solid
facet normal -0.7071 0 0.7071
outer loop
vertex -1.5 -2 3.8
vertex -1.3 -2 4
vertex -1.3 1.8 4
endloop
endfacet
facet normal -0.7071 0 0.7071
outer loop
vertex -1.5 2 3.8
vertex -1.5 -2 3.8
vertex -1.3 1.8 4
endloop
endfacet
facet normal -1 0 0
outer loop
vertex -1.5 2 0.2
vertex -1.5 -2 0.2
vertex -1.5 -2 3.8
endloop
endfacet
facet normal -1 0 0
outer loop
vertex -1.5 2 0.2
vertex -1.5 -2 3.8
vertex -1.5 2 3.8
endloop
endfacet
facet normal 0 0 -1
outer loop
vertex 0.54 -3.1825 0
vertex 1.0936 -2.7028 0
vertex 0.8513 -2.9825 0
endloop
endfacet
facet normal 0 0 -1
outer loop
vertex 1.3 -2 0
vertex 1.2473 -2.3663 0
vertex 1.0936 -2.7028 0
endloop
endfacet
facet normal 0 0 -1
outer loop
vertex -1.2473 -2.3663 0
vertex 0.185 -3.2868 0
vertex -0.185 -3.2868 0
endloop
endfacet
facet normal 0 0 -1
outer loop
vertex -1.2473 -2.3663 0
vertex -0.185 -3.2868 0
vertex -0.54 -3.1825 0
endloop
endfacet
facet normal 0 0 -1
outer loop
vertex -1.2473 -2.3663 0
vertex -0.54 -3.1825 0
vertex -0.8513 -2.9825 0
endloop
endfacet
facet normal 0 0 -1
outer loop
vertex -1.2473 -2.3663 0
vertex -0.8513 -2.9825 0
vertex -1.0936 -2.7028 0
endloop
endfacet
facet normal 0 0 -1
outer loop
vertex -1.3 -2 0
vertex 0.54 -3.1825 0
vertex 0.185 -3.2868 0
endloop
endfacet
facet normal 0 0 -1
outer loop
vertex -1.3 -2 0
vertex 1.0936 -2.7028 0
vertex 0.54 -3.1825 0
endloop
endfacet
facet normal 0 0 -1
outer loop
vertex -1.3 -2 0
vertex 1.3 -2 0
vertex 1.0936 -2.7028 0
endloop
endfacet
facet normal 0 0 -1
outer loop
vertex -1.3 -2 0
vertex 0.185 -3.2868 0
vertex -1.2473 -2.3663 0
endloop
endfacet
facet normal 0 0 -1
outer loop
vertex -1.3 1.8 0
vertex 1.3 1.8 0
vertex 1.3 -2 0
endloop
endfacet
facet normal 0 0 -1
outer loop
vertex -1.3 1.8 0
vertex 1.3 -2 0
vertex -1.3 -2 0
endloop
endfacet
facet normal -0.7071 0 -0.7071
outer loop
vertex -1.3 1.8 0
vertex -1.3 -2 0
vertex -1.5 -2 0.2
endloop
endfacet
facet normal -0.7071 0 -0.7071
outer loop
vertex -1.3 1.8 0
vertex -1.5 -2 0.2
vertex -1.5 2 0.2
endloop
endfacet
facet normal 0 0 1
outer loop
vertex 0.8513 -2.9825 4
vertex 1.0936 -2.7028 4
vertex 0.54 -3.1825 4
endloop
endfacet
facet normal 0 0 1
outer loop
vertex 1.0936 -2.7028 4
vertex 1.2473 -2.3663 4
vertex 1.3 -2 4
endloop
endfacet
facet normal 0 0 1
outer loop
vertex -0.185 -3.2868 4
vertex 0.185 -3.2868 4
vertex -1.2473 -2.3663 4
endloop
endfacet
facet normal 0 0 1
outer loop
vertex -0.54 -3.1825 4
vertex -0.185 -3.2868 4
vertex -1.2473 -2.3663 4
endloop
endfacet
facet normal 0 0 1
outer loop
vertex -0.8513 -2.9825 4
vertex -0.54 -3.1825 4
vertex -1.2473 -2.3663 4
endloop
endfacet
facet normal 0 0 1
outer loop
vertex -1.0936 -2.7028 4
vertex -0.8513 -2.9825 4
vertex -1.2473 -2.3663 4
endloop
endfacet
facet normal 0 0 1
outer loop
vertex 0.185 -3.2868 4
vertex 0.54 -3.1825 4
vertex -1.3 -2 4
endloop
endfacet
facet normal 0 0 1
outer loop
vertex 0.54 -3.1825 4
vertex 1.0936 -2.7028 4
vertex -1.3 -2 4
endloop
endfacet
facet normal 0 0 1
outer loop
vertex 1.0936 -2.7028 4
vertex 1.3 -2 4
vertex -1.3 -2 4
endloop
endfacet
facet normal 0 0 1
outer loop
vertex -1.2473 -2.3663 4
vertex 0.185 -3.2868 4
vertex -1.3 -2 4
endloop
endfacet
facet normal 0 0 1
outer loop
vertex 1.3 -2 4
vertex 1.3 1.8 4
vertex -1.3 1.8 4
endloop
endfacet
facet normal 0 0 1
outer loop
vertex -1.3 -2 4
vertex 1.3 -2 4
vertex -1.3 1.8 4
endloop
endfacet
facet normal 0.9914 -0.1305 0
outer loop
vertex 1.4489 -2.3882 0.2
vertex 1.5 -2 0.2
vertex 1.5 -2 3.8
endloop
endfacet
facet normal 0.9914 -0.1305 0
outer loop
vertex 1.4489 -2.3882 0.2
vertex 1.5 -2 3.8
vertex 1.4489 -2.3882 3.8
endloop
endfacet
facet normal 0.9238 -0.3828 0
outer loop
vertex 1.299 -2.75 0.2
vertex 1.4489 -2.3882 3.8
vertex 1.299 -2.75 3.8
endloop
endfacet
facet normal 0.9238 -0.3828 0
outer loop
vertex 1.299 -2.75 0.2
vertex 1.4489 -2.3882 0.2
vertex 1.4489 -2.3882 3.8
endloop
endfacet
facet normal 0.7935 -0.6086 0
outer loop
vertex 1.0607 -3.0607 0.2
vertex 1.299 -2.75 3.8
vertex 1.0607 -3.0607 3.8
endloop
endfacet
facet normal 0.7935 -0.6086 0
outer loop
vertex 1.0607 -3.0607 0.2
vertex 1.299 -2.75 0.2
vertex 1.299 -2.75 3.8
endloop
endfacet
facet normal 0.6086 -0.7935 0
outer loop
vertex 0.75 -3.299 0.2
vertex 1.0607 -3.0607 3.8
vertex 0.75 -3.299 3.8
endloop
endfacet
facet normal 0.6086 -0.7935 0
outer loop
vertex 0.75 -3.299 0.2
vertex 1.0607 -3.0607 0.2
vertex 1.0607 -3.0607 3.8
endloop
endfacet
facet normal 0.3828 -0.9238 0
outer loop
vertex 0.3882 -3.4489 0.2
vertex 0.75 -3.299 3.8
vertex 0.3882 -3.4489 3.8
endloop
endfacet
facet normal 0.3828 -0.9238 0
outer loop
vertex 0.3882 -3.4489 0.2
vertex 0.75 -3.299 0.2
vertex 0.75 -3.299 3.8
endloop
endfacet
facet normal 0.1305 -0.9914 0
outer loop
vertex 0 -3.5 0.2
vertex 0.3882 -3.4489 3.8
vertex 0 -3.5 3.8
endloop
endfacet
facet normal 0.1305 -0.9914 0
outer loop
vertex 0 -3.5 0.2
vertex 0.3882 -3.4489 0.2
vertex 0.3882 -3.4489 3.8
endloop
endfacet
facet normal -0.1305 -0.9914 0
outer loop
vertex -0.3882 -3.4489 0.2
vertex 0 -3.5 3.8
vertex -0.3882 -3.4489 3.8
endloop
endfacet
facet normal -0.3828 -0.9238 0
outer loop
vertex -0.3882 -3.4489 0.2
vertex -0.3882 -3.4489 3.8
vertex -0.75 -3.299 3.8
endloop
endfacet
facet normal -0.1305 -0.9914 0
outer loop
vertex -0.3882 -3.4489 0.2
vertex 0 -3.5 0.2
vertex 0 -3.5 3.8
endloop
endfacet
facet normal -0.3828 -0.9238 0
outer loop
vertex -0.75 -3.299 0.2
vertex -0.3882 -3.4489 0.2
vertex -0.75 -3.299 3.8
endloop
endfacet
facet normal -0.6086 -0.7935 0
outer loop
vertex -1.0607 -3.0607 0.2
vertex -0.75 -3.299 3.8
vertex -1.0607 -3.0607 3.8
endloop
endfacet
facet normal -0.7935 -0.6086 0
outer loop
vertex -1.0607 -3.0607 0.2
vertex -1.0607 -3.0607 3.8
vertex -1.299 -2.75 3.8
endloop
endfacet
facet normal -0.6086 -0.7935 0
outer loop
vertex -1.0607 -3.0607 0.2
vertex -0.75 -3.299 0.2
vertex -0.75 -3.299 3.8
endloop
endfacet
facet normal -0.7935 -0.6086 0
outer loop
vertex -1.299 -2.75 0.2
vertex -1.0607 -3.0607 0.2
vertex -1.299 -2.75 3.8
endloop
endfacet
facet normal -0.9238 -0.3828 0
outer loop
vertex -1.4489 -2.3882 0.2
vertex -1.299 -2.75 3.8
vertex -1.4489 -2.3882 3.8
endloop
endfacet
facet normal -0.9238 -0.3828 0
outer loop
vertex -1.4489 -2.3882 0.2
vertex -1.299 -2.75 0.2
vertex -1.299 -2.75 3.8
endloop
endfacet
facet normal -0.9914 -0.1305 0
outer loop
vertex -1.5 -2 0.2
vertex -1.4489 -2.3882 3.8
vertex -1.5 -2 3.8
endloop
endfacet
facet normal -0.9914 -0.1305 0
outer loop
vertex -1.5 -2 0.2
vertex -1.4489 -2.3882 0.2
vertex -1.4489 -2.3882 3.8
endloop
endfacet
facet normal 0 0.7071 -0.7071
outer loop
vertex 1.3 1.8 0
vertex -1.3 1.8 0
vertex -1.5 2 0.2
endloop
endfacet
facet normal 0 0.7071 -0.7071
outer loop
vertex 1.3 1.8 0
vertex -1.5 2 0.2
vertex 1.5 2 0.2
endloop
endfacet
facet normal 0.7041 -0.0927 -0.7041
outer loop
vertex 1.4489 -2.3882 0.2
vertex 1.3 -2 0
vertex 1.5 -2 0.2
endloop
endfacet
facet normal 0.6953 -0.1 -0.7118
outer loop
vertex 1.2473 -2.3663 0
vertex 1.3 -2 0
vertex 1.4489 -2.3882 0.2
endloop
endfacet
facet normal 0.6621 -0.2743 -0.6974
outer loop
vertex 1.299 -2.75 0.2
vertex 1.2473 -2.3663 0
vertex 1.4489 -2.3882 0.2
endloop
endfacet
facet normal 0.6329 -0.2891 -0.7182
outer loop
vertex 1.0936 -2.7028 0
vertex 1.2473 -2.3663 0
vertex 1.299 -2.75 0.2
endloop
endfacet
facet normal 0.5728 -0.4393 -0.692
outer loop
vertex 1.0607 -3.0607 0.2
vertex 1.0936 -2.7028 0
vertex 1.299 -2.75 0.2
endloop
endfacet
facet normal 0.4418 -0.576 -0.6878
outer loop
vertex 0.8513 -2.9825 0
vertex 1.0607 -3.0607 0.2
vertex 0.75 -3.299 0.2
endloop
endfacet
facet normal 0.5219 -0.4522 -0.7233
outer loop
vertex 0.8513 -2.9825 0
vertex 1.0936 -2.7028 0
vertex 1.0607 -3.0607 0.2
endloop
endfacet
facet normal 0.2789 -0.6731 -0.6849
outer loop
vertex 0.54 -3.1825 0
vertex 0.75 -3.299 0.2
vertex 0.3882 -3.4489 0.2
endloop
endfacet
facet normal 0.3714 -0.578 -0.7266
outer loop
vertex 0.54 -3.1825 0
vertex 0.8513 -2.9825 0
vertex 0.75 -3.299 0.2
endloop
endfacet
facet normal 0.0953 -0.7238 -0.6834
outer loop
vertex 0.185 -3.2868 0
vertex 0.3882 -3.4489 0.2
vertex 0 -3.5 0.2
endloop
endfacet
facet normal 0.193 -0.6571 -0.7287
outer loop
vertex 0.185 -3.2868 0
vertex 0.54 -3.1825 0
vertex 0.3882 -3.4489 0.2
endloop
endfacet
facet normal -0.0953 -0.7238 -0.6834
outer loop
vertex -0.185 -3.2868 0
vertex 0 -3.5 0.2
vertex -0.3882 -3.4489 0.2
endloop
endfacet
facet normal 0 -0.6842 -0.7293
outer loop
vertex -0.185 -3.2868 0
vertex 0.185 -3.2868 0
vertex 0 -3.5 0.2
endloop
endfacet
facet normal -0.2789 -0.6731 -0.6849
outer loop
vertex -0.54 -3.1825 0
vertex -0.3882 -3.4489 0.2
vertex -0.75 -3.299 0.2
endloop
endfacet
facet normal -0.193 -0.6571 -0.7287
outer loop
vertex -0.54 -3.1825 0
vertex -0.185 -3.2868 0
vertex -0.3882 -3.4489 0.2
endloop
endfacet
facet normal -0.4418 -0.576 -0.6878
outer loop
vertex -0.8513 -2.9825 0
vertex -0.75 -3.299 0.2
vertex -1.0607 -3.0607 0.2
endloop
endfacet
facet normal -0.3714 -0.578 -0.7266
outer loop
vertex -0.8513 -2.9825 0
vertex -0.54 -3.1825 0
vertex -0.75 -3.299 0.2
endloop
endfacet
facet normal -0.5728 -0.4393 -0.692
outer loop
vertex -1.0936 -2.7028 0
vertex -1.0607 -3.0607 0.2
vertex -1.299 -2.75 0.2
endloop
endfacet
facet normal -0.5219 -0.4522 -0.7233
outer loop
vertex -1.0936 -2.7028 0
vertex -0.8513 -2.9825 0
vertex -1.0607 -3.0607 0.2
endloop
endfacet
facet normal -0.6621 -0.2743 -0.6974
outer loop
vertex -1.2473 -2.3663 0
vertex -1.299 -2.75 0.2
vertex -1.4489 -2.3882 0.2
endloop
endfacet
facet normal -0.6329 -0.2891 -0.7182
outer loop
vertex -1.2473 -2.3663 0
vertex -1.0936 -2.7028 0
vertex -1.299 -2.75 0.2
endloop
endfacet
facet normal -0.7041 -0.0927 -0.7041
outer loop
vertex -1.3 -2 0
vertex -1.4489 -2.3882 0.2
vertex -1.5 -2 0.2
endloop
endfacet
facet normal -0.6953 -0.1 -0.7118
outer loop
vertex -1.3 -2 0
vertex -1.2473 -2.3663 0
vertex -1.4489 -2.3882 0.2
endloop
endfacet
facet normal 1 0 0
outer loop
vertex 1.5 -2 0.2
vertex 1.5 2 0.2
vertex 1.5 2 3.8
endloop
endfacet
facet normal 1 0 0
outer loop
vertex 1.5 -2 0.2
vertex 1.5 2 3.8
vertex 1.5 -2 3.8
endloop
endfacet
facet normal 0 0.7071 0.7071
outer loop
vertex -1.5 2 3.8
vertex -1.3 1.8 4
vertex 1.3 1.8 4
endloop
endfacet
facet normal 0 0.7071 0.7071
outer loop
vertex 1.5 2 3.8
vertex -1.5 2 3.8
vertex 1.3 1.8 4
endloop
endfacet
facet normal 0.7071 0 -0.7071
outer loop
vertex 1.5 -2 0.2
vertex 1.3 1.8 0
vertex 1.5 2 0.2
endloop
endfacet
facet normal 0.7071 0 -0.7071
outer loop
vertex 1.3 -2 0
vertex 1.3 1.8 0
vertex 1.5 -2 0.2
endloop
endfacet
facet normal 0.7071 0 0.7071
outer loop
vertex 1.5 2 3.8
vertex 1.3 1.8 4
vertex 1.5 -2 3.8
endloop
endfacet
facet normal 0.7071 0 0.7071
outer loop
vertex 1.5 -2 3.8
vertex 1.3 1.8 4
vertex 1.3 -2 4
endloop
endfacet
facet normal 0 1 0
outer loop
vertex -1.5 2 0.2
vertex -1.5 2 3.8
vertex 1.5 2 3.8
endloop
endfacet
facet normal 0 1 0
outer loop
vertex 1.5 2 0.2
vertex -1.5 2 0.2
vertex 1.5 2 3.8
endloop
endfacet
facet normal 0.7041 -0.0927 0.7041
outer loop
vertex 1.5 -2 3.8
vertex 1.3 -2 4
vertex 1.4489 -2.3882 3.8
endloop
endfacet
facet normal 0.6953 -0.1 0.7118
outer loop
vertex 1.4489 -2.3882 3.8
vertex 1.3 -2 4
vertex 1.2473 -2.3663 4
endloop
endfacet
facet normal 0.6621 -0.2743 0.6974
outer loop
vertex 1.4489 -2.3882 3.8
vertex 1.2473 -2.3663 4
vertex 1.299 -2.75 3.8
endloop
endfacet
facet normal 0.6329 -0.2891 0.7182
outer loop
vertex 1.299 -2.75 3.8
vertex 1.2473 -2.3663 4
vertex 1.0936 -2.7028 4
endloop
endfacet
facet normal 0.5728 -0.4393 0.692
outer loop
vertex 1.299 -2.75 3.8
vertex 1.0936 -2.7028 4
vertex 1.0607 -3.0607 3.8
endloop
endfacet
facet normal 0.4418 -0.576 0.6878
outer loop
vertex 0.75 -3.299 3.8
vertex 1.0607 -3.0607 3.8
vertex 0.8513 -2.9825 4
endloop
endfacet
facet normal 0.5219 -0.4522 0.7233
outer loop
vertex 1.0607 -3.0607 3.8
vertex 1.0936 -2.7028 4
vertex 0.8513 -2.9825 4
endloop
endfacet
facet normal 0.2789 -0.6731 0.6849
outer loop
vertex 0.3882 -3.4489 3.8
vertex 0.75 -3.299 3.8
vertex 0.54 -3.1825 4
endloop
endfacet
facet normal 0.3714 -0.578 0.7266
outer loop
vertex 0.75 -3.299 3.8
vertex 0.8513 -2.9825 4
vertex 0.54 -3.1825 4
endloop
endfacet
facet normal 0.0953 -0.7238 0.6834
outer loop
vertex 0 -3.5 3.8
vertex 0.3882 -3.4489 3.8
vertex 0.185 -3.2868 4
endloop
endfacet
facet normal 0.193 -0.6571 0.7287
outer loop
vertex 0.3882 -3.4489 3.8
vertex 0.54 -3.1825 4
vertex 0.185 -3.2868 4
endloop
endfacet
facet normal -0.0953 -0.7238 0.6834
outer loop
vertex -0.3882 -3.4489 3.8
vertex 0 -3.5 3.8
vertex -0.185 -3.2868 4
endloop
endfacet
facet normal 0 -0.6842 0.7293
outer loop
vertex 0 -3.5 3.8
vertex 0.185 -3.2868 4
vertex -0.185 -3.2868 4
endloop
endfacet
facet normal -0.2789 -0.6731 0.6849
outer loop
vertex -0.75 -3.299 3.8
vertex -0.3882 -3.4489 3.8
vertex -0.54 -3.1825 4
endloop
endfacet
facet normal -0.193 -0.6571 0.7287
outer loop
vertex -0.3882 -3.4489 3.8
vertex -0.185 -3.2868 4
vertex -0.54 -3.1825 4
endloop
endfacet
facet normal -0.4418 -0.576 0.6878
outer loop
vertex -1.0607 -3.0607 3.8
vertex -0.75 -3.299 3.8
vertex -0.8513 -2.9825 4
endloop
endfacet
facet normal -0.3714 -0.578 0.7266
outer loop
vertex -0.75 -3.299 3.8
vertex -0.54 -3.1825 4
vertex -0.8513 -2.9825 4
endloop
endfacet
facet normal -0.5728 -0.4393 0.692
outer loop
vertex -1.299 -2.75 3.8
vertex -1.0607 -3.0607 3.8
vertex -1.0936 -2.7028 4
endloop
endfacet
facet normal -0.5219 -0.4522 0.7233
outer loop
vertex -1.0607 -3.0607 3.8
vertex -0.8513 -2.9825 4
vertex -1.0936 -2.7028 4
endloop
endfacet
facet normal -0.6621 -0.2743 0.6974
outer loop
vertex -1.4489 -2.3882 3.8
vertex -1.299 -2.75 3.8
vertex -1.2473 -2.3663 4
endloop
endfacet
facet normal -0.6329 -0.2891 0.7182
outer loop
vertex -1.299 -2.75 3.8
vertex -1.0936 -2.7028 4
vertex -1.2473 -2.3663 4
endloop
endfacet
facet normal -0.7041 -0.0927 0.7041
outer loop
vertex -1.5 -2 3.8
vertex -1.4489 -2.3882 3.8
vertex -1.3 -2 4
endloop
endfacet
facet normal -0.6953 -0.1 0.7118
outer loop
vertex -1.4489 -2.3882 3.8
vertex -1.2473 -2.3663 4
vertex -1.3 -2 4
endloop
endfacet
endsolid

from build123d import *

# Parameters (mm, degrees)
EXTRUDE_1_DEPTH     = 4
CUT_EXTRUDE_1_REACH = 7.523
CHAMFER_1_SIZE      = 0.2


with BuildPart() as part:
    # 草图1 → 凸台-拉伸1 (new body)
    with BuildSketch(Plane.XY):
        with BuildLine():
            Line((-1.5, -2), (-1.5, 2))
            ThreePointArc((-1.5, 2), (0, 3.5), (1.5, 2))
            Line((1.5, 2), (1.5, -2))
            ThreePointArc((1.5, -2), (0, -3.5), (-1.5, -2))
        make_face()
    extrude(amount=EXTRUDE_1_DEPTH)

    # 草图2 → 切除-拉伸1 (cut, up to next)
    with BuildSketch(Plane.XY.offset(4), mode=Mode.PRIVATE) as cut_extrude_1_sk1:
        with BuildLine():
            Line((-1.5, 2), (1.5, 2))
            ThreePointArc((1.5, 2), (0, 3.5), (-1.5, 2))
        make_face()
    cut_extrude_1_tool1 = extrude(cut_extrude_1_sk1.sketch, amount=-CUT_EXTRUDE_1_REACH, mode=Mode.PRIVATE) & part.part
    add(cut_extrude_1_tool1.solids().sort_by_distance((0, 2.63662, 4))[0], mode=Mode.SUBTRACT)

    # 倒角1
    chamfer_1_edges = [part.edges().sort_by_distance(p)[0] for p in [
        (0, 2, 4),
        (-1.5, 0, 4),
        (0, 2, 0),
        (0, -3.5, 4),
        (-1.5, 0, 0),
        (1.5, 0, 0),
        (0, -3.5, 0),
        (1.5, 0, 4),
    ]]
    chamfer(chamfer_1_edges, length=CHAMFER_1_SIZE)


solid = part.part
